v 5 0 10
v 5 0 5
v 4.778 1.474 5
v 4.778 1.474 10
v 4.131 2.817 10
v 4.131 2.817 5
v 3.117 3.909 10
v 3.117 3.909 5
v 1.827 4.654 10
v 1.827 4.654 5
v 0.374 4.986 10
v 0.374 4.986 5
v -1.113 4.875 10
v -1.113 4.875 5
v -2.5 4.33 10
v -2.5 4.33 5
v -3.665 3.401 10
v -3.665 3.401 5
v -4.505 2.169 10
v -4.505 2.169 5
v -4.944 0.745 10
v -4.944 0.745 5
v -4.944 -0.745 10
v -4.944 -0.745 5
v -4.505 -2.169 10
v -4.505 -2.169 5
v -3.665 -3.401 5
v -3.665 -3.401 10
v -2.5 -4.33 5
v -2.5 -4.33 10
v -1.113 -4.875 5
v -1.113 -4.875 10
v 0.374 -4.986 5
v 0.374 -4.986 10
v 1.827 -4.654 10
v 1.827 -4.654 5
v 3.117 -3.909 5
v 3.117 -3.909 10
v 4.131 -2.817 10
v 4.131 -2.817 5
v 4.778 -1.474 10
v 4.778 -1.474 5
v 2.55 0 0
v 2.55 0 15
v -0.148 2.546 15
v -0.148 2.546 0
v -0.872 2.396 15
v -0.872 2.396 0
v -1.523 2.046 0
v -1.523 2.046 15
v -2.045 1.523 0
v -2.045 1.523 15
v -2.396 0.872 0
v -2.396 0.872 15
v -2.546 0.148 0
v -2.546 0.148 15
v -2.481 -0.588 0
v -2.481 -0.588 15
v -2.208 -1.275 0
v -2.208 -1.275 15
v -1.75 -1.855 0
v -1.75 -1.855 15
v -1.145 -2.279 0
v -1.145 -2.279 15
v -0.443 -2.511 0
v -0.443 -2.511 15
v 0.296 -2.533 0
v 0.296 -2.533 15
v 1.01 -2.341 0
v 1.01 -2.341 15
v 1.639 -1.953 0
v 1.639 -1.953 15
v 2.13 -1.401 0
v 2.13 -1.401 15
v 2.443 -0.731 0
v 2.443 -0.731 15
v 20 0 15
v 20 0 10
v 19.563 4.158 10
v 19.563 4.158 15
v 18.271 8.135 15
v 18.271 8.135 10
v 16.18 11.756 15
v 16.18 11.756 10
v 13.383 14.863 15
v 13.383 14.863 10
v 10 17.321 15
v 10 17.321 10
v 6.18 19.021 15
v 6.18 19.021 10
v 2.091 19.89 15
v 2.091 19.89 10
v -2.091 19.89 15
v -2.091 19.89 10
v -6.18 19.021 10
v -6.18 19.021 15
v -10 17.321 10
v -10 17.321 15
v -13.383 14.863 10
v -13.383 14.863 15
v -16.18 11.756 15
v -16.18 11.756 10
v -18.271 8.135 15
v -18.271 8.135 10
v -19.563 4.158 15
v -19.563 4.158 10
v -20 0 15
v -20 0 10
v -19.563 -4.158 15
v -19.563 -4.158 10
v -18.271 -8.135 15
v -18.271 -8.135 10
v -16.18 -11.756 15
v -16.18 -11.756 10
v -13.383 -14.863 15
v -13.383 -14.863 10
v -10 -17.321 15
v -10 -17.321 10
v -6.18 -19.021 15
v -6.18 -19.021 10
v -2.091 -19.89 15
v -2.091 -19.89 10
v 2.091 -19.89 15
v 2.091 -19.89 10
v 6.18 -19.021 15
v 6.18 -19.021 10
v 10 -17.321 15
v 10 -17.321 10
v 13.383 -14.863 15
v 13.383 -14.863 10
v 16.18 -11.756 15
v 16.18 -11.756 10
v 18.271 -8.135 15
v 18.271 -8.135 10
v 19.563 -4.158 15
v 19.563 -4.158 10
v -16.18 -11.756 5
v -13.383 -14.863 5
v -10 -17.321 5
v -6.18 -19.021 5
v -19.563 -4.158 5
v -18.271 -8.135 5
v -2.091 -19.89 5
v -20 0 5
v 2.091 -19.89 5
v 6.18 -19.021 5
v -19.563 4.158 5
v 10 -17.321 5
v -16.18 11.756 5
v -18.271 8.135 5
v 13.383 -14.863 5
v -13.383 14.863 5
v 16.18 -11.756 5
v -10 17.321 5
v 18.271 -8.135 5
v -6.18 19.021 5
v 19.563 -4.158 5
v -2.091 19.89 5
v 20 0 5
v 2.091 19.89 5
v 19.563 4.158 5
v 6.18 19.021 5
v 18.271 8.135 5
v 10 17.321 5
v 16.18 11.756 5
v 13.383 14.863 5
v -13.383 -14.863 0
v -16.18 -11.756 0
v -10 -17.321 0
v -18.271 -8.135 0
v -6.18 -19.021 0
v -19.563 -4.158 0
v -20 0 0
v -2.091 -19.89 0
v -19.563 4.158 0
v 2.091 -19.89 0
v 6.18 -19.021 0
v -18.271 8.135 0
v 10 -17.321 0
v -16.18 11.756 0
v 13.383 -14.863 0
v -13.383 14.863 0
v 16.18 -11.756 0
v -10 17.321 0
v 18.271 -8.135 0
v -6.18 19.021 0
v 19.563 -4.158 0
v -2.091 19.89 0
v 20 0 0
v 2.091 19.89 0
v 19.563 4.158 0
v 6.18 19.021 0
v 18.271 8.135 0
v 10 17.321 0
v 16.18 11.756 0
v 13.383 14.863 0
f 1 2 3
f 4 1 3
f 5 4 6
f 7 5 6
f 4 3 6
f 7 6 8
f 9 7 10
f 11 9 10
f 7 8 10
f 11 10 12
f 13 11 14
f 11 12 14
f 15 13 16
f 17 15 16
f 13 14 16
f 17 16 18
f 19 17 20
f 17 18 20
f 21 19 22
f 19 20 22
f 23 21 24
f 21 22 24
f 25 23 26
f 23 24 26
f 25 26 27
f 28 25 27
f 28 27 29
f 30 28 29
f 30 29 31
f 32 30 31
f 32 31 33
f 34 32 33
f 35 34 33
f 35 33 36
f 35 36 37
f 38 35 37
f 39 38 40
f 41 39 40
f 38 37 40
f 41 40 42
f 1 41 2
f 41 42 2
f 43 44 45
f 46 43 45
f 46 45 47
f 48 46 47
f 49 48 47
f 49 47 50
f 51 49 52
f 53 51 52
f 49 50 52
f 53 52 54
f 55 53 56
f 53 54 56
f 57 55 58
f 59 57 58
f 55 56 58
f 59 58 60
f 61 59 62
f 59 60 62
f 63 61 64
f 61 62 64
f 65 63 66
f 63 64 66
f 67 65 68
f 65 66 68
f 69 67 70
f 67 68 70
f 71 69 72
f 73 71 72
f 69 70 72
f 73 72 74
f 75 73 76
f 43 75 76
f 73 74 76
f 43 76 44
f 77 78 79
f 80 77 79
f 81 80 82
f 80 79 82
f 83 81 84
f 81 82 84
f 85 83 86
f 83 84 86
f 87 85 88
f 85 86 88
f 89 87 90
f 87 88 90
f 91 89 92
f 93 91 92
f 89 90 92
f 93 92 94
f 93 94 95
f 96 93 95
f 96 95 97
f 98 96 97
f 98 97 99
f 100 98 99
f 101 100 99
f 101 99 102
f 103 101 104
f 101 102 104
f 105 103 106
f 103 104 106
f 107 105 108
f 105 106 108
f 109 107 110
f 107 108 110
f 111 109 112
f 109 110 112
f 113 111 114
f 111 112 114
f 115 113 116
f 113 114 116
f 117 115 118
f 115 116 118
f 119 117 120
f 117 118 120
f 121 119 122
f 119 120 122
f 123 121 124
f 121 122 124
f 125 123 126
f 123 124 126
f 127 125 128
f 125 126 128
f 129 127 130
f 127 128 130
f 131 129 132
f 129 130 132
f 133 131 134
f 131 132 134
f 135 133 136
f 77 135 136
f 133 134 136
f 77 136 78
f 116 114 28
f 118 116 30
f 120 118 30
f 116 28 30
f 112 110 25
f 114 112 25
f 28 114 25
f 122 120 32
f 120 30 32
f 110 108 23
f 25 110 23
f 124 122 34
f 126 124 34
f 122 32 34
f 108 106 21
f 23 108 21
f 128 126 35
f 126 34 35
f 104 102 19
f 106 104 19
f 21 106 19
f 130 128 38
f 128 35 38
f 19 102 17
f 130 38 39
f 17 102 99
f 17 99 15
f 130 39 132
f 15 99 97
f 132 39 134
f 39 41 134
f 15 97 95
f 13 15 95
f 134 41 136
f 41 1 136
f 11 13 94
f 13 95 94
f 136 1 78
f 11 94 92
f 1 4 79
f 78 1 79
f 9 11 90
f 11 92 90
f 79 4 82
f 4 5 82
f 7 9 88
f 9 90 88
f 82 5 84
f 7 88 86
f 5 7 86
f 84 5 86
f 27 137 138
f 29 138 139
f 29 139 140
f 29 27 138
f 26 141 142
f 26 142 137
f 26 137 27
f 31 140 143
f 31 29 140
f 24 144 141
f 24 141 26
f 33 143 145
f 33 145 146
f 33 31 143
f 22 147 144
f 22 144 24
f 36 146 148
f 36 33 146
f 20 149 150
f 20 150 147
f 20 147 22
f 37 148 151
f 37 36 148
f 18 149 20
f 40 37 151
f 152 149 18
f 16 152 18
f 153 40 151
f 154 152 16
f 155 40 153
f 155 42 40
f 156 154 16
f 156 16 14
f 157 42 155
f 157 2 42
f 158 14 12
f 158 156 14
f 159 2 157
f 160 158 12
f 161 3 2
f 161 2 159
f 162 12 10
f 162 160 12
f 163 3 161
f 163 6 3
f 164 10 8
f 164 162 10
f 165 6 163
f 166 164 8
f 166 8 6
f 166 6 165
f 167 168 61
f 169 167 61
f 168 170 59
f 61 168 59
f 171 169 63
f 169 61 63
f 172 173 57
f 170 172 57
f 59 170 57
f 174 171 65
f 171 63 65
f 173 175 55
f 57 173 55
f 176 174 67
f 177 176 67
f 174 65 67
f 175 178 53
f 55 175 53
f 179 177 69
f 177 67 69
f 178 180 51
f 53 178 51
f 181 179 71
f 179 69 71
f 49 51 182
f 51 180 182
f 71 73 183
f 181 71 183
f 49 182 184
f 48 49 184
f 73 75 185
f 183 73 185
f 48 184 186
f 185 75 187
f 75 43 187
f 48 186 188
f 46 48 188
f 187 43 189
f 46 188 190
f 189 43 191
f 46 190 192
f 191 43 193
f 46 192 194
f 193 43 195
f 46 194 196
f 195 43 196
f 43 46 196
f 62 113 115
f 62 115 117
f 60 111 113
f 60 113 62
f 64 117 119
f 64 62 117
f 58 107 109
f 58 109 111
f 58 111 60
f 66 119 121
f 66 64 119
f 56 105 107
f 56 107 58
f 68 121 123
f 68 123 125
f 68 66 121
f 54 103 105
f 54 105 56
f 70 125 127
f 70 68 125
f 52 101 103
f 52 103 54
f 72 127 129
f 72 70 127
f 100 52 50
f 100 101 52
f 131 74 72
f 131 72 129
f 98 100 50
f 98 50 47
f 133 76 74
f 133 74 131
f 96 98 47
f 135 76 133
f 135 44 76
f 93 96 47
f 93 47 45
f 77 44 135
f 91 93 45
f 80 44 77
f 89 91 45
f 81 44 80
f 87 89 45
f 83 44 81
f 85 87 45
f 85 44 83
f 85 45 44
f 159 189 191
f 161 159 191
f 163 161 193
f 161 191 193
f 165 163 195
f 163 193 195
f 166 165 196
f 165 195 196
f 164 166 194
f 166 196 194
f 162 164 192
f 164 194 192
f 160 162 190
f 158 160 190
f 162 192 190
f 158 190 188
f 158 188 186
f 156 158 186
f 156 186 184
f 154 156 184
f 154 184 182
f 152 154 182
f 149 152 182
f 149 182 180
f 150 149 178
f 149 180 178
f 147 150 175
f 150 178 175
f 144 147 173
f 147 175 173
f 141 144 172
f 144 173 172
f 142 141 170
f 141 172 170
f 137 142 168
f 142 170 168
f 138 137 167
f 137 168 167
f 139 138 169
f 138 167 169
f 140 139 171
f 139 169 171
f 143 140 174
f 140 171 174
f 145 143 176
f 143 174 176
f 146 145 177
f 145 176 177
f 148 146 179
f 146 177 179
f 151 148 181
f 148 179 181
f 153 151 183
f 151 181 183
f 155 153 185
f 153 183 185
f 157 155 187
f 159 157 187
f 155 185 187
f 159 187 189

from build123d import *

# Parameters (mm, degrees)
F0_R     = 20
F1_DEPTH = 5
F2_R     = 5
F3_DEPTH = 5
F4_R     = 20
F5_DEPTH = 5
F7_DEPTH = 25


with BuildPart() as f1:
    # F0 (on Top) → F1 (new body)
    with BuildSketch(Plane.XY):
        Circle(F0_R)
    extrude(amount=F1_DEPTH)

    # F2 (on face) → F3 (join)
    with BuildSketch(Plane.XY.offset(5)):
        Circle(F2_R)
    extrude(amount=F3_DEPTH)

    # F4 (on face) → F5 (join)
    with BuildSketch(Plane.XY.offset(10)):
        Circle(F4_R)
    extrude(amount=F5_DEPTH)

    # F6 (on face) → F7 (cut)
    with BuildSketch(Plane.XY.offset(15)):
        with BuildLine():
            ThreePointArc((-0.1480392157, 2.5456991948), (-1.75, -1.8547236991), (2.55, 0))
            Line((2.55, 0), (-0.1480392157, 2.5456991948))
        make_face()
    extrude(amount=-F7_DEPTH, mode=Mode.SUBTRACT)


solid = f1.part
